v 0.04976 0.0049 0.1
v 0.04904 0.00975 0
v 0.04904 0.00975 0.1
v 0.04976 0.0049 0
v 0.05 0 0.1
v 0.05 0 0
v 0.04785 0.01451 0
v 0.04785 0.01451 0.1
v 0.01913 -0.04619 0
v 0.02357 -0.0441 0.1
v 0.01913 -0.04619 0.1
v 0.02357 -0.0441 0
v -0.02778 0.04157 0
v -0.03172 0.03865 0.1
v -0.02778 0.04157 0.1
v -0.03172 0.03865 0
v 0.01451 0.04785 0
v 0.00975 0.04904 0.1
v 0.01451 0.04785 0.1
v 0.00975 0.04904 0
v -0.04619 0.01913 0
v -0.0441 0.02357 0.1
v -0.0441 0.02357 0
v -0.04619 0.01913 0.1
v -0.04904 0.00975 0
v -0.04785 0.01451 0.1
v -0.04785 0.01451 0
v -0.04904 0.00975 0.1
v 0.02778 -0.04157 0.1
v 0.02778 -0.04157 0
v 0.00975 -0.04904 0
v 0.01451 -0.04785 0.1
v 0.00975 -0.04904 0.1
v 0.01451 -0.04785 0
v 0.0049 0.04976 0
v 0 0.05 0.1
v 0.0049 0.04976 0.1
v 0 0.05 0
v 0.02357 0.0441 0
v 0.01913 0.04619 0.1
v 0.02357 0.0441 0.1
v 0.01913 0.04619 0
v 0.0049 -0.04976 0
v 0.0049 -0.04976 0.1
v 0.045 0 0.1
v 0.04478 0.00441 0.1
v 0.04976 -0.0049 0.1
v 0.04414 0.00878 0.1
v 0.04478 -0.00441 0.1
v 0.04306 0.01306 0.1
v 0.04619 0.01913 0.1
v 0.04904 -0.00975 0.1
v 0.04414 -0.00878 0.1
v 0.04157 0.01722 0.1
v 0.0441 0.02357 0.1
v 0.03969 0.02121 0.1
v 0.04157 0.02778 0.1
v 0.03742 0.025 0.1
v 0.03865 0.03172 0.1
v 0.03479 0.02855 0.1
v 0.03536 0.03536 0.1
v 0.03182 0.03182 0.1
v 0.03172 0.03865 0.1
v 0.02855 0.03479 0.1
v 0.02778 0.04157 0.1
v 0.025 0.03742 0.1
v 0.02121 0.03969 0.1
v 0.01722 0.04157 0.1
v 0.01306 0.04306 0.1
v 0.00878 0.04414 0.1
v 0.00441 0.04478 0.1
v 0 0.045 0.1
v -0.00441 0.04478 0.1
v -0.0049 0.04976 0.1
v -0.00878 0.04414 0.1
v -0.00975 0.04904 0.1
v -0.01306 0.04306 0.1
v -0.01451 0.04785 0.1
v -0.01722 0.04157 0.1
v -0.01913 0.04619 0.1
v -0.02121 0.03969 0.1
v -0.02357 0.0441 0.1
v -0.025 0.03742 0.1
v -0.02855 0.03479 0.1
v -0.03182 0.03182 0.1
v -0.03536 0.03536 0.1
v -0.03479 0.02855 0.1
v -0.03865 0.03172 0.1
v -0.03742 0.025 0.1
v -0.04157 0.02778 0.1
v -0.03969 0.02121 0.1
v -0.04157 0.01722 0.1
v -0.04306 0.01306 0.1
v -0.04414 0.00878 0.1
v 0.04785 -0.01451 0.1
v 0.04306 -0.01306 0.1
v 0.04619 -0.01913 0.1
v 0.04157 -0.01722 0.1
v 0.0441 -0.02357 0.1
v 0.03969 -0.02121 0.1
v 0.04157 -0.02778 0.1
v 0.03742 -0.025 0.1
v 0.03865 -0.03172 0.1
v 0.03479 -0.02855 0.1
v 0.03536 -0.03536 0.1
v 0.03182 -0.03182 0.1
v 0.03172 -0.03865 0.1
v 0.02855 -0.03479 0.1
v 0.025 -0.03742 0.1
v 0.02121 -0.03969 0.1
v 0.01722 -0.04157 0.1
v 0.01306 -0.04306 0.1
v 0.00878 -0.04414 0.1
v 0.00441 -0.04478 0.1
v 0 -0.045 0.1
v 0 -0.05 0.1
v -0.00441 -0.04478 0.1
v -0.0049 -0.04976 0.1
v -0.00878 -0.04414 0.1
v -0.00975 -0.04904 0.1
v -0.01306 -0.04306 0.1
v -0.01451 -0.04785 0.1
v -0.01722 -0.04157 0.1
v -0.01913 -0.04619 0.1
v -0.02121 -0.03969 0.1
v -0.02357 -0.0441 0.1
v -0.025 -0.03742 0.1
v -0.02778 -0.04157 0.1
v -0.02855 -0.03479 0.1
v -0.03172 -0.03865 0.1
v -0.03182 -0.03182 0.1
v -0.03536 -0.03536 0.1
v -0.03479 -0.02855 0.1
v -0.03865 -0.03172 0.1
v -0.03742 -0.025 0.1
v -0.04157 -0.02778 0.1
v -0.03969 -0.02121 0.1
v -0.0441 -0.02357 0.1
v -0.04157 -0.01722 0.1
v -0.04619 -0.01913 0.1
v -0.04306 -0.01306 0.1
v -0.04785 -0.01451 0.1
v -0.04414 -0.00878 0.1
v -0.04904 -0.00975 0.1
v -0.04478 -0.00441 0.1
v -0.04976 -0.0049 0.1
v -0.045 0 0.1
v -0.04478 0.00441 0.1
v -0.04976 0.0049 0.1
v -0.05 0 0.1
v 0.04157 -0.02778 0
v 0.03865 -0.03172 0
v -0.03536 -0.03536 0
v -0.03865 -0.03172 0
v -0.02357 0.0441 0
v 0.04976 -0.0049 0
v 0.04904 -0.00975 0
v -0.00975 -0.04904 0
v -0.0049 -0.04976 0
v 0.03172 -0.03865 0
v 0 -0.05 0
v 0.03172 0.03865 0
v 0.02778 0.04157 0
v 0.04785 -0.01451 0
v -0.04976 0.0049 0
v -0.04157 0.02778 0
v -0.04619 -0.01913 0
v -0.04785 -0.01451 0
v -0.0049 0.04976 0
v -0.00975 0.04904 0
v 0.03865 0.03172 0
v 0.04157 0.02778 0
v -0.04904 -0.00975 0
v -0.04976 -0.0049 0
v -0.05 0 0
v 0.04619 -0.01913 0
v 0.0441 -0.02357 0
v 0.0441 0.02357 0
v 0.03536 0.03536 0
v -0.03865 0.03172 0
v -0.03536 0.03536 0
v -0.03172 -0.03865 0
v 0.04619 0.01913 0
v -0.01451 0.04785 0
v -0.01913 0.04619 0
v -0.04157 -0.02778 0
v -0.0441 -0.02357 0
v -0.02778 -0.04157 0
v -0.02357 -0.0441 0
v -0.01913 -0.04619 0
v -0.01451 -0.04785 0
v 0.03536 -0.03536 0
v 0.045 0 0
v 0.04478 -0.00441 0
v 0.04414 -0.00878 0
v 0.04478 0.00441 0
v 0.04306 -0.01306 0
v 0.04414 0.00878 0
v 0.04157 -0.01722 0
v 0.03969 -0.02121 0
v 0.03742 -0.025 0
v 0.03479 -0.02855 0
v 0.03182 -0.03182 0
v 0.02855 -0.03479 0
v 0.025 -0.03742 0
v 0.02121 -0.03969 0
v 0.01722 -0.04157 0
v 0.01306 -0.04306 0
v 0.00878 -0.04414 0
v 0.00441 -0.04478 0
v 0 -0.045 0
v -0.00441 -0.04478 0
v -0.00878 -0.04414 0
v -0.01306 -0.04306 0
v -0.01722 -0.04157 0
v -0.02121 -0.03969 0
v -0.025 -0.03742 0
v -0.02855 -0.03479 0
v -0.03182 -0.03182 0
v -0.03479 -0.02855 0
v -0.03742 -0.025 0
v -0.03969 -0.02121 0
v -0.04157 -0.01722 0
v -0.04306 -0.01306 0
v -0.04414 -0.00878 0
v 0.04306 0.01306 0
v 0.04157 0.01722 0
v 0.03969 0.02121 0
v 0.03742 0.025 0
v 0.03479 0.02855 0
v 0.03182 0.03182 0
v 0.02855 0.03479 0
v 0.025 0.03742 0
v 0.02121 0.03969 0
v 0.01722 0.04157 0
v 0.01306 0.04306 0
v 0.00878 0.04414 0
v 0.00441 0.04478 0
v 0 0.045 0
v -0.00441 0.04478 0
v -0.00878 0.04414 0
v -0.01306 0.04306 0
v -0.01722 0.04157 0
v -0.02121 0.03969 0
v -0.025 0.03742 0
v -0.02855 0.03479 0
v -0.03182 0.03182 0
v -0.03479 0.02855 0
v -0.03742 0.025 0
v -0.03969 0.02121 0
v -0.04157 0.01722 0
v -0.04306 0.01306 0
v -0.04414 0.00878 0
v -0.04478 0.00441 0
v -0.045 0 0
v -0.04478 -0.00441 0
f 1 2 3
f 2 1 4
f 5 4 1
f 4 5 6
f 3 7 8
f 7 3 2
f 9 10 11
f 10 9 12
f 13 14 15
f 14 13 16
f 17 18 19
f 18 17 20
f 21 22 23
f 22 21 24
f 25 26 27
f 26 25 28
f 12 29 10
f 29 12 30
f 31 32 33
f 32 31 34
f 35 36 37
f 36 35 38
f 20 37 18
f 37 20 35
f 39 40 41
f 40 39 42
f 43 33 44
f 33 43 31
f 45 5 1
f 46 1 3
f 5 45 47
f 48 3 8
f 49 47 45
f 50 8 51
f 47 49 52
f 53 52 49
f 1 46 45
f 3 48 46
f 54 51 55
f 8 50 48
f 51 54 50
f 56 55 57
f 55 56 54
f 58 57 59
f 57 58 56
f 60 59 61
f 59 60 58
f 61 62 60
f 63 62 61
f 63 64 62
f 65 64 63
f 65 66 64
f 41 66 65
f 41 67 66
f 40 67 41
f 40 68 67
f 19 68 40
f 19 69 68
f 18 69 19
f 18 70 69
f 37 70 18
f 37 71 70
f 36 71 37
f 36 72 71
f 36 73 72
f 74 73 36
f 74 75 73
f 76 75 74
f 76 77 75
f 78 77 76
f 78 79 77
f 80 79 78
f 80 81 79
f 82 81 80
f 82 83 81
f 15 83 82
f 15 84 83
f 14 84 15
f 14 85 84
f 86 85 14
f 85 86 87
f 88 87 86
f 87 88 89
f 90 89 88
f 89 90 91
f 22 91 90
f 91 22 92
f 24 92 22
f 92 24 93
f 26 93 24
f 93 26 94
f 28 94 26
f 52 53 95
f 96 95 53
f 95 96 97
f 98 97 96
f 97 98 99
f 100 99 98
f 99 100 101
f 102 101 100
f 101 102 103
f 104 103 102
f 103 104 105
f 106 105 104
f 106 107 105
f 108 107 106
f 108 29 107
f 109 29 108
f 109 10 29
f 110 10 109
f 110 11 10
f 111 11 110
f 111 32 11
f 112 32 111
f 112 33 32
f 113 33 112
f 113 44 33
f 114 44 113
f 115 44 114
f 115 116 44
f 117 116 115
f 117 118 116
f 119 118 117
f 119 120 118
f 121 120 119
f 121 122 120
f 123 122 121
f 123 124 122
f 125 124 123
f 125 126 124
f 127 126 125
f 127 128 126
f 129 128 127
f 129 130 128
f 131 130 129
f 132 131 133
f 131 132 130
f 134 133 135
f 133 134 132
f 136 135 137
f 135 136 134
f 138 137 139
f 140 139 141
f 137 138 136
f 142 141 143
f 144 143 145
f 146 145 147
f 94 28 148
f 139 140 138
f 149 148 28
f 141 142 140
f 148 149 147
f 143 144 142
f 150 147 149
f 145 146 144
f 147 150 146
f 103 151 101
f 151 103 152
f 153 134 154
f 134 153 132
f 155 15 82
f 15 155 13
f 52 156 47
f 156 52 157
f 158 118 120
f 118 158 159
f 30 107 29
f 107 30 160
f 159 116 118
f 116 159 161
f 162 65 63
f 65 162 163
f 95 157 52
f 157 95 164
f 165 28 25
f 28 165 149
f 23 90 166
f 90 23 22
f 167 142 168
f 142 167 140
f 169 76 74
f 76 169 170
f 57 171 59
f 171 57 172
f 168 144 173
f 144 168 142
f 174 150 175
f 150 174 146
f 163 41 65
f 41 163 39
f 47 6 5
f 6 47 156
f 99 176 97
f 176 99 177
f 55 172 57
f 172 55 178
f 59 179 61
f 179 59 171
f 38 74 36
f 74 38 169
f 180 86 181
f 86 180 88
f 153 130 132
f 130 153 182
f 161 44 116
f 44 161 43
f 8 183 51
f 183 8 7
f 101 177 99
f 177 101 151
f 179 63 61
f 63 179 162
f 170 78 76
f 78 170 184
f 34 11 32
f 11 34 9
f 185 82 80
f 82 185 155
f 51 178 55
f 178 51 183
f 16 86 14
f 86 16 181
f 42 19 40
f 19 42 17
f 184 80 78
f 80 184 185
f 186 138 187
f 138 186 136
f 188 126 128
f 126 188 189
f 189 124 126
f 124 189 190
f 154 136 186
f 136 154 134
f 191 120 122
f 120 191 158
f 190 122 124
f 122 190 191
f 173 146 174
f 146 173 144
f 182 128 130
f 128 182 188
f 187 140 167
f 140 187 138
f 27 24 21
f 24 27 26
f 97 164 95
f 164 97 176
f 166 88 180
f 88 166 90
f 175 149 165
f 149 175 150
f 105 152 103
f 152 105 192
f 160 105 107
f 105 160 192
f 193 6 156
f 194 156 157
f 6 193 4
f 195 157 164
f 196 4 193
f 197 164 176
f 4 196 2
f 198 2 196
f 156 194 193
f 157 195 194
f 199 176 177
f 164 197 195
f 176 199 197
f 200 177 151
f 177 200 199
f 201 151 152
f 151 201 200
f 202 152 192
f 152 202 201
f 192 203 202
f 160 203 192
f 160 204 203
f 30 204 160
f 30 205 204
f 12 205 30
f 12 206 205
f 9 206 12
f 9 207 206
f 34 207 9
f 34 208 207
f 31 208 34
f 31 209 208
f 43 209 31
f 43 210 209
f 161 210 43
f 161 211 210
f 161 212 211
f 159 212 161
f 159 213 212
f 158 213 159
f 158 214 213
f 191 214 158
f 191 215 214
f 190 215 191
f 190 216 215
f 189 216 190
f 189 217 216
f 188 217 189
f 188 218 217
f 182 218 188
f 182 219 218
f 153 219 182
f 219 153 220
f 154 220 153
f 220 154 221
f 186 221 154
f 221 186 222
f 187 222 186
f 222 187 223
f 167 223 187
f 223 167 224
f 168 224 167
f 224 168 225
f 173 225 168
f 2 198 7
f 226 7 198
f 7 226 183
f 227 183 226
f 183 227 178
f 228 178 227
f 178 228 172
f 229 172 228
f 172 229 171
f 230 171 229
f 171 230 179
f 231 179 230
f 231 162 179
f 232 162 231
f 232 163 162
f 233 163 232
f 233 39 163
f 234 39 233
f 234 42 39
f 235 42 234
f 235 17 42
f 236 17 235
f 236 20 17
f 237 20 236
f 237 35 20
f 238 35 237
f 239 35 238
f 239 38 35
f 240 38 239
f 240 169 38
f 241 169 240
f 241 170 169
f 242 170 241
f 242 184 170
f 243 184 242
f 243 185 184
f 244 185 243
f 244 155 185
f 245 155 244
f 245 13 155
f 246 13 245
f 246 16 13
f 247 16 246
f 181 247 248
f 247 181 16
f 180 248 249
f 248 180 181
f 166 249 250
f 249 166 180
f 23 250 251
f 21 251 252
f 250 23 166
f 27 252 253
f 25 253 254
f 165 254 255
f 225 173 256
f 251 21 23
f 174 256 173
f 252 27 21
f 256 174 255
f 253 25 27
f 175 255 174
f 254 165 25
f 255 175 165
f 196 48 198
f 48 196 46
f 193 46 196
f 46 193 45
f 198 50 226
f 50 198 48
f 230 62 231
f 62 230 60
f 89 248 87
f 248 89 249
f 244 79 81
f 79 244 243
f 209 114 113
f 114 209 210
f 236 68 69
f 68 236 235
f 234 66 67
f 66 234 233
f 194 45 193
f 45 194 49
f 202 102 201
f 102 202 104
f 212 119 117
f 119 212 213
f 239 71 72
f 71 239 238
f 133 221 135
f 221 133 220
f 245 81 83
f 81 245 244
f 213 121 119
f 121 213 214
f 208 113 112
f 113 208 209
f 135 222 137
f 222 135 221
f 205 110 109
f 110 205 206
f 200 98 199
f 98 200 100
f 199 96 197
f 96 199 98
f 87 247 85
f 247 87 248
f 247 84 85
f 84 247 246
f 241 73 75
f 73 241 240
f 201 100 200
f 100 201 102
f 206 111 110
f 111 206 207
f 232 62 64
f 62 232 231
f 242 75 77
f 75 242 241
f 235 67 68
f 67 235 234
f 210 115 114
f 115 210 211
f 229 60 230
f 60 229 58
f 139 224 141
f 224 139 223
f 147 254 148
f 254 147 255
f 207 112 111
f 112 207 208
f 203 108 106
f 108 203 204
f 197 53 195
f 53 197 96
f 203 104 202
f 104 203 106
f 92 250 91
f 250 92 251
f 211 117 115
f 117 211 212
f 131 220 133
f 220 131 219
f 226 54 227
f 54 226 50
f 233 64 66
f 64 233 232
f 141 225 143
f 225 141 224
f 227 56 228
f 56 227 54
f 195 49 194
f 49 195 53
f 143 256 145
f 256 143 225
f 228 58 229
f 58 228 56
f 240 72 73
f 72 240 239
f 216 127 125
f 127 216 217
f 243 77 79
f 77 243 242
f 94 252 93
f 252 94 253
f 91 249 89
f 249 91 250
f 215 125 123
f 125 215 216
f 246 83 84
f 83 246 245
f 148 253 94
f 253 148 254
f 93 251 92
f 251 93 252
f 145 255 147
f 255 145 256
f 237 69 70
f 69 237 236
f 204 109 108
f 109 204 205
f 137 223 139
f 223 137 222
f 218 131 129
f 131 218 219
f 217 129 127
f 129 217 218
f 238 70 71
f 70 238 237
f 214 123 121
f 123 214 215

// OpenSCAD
module rounded_cylinder(diameter, height, fillet_radius, facets) {
    difference() {
        cylinder(d=diameter, h=height, $fn=facets);
        translate([0, 0, -fillet_radius])
            cylinder(d=diameter - 2 * fillet_radius, h=height + 2 * fillet_radius, $fn=facets);
    }
}

scale([0.1, 0.1, 0.1])
    rounded_cylinder(1, 1, 0.05, 64);
